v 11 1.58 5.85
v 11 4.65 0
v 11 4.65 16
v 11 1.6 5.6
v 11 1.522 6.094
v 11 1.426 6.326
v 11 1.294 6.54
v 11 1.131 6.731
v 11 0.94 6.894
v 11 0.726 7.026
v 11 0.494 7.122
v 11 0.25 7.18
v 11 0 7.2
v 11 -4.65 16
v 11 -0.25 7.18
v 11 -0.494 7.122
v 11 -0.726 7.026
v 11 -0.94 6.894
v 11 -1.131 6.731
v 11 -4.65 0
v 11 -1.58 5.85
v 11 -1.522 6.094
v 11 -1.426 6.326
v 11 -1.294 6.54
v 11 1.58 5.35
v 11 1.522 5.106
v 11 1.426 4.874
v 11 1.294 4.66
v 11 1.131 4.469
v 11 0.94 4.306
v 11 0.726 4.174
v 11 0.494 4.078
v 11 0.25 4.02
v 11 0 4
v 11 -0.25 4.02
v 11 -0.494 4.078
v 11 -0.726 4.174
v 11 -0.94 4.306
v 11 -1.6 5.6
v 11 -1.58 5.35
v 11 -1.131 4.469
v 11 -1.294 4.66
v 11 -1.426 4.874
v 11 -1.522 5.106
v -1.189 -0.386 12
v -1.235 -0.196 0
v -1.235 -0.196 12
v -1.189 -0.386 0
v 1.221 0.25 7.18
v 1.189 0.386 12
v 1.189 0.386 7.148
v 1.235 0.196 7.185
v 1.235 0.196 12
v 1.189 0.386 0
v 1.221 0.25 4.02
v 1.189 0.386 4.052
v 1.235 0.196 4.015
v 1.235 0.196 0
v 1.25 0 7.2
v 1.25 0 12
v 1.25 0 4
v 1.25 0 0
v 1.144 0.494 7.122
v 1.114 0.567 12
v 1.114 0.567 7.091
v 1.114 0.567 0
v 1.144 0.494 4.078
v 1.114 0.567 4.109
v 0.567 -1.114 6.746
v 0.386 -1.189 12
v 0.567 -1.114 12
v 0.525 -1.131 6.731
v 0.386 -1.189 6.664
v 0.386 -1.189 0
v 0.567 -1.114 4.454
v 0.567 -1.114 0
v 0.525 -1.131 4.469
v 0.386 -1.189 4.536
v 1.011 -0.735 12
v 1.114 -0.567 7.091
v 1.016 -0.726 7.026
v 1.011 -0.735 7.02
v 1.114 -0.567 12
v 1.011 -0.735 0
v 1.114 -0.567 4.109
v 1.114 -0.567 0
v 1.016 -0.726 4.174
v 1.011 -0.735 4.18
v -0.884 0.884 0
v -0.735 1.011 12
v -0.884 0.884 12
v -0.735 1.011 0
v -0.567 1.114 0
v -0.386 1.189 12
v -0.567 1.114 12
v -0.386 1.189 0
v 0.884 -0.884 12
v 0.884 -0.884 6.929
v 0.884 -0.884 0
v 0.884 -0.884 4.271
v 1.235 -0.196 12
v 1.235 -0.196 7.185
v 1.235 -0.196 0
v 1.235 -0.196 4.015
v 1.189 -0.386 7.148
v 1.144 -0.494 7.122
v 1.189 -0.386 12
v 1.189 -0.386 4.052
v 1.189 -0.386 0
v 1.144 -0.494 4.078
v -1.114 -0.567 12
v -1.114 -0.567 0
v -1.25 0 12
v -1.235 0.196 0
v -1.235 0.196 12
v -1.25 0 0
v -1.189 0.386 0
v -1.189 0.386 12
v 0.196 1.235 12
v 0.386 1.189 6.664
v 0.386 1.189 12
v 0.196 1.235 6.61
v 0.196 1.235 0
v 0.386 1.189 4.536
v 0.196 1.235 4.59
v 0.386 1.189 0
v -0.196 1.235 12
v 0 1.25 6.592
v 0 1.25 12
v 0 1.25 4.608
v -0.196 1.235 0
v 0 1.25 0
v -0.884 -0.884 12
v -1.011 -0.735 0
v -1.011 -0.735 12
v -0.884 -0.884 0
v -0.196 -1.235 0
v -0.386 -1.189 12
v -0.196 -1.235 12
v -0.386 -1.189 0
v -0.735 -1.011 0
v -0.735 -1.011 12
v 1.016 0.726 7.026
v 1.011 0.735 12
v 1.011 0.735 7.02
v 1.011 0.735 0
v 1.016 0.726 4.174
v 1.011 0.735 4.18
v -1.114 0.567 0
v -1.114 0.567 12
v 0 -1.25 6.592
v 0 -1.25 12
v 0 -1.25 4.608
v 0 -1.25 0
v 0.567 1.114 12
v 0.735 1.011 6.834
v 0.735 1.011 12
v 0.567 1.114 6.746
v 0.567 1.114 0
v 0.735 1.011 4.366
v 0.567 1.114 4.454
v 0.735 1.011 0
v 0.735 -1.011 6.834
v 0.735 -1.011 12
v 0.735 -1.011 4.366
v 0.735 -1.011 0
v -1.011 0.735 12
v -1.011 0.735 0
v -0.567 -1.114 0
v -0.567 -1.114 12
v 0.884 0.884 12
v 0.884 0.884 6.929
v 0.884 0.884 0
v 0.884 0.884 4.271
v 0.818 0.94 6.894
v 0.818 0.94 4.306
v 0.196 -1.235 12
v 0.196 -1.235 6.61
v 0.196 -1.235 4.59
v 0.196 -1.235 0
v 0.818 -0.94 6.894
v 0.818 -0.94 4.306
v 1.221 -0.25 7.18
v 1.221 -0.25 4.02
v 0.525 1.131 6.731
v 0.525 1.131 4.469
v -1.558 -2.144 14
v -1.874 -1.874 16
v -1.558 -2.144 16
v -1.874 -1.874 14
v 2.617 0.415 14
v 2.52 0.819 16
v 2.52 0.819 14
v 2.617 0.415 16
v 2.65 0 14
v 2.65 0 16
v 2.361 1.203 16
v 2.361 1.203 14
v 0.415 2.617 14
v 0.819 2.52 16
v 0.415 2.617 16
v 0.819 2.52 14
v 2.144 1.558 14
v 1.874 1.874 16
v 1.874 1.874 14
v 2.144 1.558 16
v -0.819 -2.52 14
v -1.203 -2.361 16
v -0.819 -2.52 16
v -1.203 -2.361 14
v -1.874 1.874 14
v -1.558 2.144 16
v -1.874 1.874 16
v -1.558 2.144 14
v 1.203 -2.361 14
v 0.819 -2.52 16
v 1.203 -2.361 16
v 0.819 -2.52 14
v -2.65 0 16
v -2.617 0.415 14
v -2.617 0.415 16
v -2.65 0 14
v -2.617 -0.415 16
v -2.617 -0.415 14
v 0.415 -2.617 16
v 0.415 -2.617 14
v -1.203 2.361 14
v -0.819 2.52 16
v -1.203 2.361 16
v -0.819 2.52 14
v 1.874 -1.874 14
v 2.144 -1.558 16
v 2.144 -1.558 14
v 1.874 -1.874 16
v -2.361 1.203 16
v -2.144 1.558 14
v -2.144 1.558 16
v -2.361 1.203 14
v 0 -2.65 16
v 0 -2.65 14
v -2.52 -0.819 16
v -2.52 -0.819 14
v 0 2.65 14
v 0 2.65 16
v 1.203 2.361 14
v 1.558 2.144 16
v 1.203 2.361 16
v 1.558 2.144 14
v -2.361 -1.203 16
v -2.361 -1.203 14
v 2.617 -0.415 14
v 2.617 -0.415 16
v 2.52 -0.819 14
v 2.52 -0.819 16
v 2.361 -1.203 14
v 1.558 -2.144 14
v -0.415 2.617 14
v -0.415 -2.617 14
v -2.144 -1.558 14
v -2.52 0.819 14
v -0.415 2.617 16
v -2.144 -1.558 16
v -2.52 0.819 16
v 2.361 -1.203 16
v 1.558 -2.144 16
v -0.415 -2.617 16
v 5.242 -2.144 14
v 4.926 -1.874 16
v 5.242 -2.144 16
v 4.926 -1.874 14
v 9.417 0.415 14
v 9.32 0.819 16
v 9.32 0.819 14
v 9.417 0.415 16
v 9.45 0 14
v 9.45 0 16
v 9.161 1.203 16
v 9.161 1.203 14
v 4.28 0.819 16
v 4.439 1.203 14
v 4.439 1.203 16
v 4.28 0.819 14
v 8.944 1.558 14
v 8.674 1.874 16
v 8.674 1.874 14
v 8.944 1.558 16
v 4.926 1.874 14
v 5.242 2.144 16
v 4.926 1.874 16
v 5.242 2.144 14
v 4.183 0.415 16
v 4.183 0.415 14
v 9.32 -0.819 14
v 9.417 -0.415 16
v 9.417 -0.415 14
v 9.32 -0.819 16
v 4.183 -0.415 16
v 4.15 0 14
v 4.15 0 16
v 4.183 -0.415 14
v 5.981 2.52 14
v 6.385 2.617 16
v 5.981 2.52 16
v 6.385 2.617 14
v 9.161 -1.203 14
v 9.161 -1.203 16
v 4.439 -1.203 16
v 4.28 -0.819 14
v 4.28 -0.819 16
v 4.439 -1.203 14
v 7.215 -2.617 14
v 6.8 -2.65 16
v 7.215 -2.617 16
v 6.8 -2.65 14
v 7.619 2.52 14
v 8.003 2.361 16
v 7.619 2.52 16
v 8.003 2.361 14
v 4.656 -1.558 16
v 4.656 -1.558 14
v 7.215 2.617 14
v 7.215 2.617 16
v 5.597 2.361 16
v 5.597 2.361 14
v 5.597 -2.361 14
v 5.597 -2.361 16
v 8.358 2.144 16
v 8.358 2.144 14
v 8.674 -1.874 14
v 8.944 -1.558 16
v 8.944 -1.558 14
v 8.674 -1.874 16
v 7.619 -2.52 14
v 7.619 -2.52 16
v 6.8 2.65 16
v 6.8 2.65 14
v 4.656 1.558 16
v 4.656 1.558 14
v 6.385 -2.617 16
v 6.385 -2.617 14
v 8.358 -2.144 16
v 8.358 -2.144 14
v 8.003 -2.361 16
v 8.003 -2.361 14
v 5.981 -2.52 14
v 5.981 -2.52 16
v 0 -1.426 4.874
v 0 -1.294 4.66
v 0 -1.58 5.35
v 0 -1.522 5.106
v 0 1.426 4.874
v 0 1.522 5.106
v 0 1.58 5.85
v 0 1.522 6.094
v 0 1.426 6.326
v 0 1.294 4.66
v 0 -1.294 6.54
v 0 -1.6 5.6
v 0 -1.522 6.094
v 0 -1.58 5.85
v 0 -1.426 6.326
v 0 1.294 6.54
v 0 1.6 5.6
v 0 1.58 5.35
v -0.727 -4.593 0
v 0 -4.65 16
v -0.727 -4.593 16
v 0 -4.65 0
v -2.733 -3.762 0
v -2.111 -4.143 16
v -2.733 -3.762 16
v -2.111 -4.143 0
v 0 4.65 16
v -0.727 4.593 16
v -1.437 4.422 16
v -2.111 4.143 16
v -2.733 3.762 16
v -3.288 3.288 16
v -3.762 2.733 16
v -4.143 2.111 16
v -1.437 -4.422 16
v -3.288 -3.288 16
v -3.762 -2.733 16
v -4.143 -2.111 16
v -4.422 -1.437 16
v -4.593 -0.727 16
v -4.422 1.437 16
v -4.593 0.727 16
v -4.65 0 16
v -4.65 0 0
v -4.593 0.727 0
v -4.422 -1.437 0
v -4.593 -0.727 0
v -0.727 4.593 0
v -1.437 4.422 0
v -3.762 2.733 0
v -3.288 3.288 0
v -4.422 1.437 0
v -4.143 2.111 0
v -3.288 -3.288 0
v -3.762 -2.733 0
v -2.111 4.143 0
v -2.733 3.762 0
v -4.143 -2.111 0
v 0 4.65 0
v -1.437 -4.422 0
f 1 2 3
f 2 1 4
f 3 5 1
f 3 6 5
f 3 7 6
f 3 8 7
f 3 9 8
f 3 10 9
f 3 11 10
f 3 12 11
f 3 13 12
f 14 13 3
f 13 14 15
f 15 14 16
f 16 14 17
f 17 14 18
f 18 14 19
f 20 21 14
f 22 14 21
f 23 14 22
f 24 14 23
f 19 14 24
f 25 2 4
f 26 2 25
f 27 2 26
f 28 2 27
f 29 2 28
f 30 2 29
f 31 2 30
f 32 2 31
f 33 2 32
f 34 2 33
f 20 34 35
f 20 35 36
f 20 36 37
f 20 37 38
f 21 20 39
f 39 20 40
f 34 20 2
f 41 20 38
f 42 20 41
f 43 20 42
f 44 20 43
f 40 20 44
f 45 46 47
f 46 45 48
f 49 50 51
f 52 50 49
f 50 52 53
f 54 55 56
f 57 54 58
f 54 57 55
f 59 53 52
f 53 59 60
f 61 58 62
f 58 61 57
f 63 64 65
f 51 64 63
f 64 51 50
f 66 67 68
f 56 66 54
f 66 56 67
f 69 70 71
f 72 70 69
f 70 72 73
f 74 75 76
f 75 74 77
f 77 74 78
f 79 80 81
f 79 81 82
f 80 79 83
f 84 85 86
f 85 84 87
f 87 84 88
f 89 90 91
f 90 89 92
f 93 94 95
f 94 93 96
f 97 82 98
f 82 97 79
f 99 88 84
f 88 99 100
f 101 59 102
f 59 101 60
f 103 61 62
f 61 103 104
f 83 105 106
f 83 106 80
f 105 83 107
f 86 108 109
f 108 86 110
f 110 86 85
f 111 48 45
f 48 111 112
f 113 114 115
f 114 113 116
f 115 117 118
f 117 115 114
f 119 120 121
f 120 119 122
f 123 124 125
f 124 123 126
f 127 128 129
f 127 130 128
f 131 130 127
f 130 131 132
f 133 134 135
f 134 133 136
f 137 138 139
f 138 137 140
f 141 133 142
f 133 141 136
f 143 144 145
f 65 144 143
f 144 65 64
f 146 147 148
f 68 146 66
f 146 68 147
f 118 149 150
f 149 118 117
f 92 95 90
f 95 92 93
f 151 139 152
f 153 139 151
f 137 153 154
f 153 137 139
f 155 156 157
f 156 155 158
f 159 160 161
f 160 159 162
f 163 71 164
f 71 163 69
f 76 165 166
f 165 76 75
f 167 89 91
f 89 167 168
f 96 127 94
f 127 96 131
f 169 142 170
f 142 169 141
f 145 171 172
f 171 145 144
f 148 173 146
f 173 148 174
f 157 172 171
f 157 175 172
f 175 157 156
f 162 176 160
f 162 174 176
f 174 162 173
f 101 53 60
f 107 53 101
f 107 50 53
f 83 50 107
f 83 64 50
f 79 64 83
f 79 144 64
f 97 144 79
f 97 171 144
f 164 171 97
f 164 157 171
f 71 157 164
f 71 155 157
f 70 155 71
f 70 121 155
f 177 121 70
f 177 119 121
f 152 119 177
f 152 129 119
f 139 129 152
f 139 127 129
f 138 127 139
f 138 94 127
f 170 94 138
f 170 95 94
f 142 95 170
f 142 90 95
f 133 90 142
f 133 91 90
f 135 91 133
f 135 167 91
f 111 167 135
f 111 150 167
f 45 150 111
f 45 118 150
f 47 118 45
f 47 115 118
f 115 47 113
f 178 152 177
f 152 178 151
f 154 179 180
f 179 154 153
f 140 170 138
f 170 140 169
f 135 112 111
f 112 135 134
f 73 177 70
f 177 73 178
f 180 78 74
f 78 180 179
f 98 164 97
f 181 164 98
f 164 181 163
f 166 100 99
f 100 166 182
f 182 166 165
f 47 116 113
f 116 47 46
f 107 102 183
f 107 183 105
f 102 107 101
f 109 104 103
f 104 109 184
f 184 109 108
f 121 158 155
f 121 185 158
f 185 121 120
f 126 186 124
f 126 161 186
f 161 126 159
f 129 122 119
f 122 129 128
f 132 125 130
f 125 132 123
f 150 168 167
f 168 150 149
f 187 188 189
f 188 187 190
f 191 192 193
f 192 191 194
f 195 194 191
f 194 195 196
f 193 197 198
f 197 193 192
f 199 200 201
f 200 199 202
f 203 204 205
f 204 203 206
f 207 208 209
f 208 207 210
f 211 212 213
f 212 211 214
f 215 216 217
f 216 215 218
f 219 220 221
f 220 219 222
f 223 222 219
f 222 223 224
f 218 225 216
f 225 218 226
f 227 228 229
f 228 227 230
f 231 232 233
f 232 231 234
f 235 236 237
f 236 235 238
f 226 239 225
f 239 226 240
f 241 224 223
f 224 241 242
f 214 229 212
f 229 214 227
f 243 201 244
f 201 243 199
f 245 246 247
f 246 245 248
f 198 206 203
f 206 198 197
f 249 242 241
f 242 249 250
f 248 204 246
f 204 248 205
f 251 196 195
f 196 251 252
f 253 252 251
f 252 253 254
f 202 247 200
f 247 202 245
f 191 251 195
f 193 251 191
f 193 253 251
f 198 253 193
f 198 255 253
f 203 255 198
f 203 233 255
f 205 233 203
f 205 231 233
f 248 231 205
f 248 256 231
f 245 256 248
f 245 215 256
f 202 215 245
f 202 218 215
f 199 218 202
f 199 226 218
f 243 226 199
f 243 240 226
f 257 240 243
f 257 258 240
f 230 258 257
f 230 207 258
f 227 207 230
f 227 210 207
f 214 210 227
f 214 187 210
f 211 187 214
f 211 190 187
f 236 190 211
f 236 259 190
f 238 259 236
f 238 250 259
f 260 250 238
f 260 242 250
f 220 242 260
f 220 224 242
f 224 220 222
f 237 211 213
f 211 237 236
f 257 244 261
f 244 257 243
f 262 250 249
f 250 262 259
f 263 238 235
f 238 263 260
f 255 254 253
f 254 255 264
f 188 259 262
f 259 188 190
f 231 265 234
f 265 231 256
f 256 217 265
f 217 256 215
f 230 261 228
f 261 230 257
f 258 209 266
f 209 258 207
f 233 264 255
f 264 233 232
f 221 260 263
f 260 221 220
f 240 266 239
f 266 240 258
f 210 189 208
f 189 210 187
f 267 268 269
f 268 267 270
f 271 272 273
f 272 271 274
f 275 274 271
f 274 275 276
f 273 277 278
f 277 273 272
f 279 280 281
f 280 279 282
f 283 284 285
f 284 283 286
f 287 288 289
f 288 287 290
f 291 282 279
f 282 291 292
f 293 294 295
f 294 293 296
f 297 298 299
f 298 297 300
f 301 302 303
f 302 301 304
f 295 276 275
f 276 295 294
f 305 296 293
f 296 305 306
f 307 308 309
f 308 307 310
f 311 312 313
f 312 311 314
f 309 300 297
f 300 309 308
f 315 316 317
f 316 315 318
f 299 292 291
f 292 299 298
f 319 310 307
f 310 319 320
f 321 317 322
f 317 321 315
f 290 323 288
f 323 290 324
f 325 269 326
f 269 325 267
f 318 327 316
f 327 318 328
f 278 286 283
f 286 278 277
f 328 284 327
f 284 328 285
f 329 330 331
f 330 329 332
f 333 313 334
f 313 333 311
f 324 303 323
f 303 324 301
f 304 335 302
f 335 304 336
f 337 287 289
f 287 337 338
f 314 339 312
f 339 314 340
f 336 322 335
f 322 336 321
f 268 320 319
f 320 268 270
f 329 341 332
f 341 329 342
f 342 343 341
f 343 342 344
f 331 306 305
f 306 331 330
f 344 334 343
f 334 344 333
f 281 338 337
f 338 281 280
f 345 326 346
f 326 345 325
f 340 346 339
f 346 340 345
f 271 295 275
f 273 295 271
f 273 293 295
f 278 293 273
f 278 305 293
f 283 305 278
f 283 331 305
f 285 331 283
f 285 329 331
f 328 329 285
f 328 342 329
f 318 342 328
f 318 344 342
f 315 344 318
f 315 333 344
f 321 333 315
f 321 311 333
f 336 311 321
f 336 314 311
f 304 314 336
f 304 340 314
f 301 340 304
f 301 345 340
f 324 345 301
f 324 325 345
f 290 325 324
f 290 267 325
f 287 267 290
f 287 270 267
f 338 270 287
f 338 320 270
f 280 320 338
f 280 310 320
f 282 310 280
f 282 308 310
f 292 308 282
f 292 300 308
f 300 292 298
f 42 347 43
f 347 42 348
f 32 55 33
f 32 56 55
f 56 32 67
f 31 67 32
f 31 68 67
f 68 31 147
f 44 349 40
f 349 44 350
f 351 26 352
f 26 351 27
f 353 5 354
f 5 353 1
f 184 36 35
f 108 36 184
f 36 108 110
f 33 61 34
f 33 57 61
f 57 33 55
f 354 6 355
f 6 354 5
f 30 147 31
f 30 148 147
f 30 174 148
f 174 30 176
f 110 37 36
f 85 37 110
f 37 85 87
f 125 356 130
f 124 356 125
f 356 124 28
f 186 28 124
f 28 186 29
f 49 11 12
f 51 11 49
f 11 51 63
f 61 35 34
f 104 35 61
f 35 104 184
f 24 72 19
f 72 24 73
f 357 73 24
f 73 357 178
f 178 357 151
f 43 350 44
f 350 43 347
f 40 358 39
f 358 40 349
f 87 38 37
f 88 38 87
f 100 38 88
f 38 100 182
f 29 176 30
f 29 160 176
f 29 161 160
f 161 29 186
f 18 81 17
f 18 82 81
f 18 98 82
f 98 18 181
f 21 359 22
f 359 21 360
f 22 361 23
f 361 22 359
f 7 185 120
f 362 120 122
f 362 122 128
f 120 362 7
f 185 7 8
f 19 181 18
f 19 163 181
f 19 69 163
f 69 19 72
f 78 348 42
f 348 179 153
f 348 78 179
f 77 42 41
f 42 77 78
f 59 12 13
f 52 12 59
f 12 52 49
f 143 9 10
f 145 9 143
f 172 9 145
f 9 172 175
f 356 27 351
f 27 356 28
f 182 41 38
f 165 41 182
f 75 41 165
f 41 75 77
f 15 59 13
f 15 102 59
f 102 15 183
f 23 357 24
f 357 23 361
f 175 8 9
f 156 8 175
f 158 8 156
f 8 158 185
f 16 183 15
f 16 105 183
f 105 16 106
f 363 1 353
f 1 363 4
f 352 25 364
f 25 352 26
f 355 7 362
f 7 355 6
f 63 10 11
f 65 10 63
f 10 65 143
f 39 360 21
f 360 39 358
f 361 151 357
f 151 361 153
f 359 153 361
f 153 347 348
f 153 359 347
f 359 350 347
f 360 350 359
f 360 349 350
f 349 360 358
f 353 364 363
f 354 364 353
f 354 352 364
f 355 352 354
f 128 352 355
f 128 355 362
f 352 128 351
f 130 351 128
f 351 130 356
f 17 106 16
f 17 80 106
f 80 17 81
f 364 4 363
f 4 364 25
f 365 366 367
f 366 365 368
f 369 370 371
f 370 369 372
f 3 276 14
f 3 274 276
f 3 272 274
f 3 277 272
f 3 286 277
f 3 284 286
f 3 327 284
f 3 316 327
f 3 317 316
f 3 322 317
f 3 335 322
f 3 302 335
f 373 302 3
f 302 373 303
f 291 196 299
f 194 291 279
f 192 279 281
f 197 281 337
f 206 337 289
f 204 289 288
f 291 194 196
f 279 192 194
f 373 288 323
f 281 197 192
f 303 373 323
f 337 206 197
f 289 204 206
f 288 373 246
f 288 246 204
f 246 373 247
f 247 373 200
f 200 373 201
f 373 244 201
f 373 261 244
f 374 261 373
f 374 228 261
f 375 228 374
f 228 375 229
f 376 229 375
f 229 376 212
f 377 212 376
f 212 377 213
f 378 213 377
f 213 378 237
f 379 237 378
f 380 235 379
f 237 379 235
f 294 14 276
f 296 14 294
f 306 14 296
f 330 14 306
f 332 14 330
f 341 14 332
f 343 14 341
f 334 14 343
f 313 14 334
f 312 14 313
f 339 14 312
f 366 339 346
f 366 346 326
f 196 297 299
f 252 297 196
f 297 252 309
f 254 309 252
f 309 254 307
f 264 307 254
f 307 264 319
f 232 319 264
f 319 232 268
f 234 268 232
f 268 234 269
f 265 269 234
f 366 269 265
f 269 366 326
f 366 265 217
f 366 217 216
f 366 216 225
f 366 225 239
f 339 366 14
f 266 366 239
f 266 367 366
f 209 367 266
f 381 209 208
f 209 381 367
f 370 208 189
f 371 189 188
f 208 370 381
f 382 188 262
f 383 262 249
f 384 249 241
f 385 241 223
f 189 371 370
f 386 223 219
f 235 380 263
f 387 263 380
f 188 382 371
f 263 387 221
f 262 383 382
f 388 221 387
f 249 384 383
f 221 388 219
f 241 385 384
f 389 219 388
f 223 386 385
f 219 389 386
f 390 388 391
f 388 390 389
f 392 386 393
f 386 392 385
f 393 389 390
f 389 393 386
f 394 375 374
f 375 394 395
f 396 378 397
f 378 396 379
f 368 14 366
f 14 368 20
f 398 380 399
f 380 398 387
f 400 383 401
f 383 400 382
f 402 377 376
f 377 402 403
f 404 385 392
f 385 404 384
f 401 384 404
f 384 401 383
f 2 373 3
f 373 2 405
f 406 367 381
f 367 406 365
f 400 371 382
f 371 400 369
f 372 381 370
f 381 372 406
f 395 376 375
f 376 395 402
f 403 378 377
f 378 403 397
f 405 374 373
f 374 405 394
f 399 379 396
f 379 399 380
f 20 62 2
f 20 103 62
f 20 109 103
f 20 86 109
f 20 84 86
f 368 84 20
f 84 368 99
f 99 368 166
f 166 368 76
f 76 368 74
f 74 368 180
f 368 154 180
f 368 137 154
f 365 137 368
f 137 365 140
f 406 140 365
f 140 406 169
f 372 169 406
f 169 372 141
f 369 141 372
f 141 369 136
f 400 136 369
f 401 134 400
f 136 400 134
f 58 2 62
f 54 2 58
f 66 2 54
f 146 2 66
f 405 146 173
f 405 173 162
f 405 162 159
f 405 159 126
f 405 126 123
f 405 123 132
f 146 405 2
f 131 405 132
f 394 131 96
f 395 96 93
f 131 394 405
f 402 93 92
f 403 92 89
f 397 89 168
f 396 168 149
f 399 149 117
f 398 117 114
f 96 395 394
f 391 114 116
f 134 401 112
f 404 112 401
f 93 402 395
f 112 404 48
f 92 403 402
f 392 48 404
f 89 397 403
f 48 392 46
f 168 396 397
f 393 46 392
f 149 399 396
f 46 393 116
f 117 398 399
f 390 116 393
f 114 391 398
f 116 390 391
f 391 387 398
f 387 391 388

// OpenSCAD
$fn = 40;

stickDepth = 12;
stickDiameter = 2.5;

magnetDepth = 2;
magnetDiameter = 5.3;


sensorDepth  = 8;
sensorDiameter = 4.5;

screwHoleDepth = 11;
screwHoleDiameter = 3.2;

wallWidth = magnetDiameter+4;

sumHeightSensor = sensorDepth+magnetDepth+2;
sumHeightStick = stickDepth+magnetDepth+2;


stick();
// translate([0,20,0]) sensor();
// sensor();

// stick block
module stick() {
	difference() {
		slit(screwHoleDepth,wallWidth/2,sumHeightStick);

		union() {

			translate([screwHoleDepth,-wallWidth,-1])
			cube(size=[20,wallWidth*2,sumHeightStick+2]);

			translate([0,0,-0.5])
			cylinder(h = stickDepth+0.5, r=stickDiameter/2);

			// magnets
			translate([0,0,sumHeightStick-magnetDepth])
			cylinder(h = magnetDepth+0.5, r=magnetDiameter/2);

			translate([magnetDiameter+1.5,0,sumHeightStick-magnetDepth])
			cylinder(h = magnetDepth+0.5, r=magnetDiameter/2);


			// screw hole
			translate([0,0,(screwHoleDiameter/2)+4])
			rotate(a=[0,90,0])
			cylinder(h=screwHoleDepth+0.1,r=screwHoleDiameter/2);
		}
	}
}
	


// sensort block
module sensor() {
	difference() {
		slit(screwHoleDepth,wallWidth/2,sumHeightSensor);

		union() {

			translate([screwHoleDepth,-wallWidth,-1])
			cube(size=[20,wallWidth*2,sumHeightSensor+2]);

			translate([0,0,-0.5])
			cylinder(h = sensorDepth+0.5, r=sensorDiameter/2);

			// magnets
			translate([0,0,sumHeightSensor-magnetDepth])
			cylinder(h = magnetDepth+0.5, r=magnetDiameter/2);

			translate([magnetDiameter+1.5,0,sumHeightSensor-magnetDepth])
			cylinder(h = magnetDepth+0.5, r=magnetDiameter/2);


			// screw hole
			translate([0,0,(screwHoleDiameter/2)+2])
			rotate(a=[0,90,0])
			cylinder(h=screwHoleDepth+0.1,r=screwHoleDiameter/2);
		}
	}	
}






module slit(length,radius,height) {
	hull() {
		translate([length,0,0]) cylinder(h = height, r=radius);
		translate([0,0,0]) cylinder(h = height, r=radius);
	}
}


	
